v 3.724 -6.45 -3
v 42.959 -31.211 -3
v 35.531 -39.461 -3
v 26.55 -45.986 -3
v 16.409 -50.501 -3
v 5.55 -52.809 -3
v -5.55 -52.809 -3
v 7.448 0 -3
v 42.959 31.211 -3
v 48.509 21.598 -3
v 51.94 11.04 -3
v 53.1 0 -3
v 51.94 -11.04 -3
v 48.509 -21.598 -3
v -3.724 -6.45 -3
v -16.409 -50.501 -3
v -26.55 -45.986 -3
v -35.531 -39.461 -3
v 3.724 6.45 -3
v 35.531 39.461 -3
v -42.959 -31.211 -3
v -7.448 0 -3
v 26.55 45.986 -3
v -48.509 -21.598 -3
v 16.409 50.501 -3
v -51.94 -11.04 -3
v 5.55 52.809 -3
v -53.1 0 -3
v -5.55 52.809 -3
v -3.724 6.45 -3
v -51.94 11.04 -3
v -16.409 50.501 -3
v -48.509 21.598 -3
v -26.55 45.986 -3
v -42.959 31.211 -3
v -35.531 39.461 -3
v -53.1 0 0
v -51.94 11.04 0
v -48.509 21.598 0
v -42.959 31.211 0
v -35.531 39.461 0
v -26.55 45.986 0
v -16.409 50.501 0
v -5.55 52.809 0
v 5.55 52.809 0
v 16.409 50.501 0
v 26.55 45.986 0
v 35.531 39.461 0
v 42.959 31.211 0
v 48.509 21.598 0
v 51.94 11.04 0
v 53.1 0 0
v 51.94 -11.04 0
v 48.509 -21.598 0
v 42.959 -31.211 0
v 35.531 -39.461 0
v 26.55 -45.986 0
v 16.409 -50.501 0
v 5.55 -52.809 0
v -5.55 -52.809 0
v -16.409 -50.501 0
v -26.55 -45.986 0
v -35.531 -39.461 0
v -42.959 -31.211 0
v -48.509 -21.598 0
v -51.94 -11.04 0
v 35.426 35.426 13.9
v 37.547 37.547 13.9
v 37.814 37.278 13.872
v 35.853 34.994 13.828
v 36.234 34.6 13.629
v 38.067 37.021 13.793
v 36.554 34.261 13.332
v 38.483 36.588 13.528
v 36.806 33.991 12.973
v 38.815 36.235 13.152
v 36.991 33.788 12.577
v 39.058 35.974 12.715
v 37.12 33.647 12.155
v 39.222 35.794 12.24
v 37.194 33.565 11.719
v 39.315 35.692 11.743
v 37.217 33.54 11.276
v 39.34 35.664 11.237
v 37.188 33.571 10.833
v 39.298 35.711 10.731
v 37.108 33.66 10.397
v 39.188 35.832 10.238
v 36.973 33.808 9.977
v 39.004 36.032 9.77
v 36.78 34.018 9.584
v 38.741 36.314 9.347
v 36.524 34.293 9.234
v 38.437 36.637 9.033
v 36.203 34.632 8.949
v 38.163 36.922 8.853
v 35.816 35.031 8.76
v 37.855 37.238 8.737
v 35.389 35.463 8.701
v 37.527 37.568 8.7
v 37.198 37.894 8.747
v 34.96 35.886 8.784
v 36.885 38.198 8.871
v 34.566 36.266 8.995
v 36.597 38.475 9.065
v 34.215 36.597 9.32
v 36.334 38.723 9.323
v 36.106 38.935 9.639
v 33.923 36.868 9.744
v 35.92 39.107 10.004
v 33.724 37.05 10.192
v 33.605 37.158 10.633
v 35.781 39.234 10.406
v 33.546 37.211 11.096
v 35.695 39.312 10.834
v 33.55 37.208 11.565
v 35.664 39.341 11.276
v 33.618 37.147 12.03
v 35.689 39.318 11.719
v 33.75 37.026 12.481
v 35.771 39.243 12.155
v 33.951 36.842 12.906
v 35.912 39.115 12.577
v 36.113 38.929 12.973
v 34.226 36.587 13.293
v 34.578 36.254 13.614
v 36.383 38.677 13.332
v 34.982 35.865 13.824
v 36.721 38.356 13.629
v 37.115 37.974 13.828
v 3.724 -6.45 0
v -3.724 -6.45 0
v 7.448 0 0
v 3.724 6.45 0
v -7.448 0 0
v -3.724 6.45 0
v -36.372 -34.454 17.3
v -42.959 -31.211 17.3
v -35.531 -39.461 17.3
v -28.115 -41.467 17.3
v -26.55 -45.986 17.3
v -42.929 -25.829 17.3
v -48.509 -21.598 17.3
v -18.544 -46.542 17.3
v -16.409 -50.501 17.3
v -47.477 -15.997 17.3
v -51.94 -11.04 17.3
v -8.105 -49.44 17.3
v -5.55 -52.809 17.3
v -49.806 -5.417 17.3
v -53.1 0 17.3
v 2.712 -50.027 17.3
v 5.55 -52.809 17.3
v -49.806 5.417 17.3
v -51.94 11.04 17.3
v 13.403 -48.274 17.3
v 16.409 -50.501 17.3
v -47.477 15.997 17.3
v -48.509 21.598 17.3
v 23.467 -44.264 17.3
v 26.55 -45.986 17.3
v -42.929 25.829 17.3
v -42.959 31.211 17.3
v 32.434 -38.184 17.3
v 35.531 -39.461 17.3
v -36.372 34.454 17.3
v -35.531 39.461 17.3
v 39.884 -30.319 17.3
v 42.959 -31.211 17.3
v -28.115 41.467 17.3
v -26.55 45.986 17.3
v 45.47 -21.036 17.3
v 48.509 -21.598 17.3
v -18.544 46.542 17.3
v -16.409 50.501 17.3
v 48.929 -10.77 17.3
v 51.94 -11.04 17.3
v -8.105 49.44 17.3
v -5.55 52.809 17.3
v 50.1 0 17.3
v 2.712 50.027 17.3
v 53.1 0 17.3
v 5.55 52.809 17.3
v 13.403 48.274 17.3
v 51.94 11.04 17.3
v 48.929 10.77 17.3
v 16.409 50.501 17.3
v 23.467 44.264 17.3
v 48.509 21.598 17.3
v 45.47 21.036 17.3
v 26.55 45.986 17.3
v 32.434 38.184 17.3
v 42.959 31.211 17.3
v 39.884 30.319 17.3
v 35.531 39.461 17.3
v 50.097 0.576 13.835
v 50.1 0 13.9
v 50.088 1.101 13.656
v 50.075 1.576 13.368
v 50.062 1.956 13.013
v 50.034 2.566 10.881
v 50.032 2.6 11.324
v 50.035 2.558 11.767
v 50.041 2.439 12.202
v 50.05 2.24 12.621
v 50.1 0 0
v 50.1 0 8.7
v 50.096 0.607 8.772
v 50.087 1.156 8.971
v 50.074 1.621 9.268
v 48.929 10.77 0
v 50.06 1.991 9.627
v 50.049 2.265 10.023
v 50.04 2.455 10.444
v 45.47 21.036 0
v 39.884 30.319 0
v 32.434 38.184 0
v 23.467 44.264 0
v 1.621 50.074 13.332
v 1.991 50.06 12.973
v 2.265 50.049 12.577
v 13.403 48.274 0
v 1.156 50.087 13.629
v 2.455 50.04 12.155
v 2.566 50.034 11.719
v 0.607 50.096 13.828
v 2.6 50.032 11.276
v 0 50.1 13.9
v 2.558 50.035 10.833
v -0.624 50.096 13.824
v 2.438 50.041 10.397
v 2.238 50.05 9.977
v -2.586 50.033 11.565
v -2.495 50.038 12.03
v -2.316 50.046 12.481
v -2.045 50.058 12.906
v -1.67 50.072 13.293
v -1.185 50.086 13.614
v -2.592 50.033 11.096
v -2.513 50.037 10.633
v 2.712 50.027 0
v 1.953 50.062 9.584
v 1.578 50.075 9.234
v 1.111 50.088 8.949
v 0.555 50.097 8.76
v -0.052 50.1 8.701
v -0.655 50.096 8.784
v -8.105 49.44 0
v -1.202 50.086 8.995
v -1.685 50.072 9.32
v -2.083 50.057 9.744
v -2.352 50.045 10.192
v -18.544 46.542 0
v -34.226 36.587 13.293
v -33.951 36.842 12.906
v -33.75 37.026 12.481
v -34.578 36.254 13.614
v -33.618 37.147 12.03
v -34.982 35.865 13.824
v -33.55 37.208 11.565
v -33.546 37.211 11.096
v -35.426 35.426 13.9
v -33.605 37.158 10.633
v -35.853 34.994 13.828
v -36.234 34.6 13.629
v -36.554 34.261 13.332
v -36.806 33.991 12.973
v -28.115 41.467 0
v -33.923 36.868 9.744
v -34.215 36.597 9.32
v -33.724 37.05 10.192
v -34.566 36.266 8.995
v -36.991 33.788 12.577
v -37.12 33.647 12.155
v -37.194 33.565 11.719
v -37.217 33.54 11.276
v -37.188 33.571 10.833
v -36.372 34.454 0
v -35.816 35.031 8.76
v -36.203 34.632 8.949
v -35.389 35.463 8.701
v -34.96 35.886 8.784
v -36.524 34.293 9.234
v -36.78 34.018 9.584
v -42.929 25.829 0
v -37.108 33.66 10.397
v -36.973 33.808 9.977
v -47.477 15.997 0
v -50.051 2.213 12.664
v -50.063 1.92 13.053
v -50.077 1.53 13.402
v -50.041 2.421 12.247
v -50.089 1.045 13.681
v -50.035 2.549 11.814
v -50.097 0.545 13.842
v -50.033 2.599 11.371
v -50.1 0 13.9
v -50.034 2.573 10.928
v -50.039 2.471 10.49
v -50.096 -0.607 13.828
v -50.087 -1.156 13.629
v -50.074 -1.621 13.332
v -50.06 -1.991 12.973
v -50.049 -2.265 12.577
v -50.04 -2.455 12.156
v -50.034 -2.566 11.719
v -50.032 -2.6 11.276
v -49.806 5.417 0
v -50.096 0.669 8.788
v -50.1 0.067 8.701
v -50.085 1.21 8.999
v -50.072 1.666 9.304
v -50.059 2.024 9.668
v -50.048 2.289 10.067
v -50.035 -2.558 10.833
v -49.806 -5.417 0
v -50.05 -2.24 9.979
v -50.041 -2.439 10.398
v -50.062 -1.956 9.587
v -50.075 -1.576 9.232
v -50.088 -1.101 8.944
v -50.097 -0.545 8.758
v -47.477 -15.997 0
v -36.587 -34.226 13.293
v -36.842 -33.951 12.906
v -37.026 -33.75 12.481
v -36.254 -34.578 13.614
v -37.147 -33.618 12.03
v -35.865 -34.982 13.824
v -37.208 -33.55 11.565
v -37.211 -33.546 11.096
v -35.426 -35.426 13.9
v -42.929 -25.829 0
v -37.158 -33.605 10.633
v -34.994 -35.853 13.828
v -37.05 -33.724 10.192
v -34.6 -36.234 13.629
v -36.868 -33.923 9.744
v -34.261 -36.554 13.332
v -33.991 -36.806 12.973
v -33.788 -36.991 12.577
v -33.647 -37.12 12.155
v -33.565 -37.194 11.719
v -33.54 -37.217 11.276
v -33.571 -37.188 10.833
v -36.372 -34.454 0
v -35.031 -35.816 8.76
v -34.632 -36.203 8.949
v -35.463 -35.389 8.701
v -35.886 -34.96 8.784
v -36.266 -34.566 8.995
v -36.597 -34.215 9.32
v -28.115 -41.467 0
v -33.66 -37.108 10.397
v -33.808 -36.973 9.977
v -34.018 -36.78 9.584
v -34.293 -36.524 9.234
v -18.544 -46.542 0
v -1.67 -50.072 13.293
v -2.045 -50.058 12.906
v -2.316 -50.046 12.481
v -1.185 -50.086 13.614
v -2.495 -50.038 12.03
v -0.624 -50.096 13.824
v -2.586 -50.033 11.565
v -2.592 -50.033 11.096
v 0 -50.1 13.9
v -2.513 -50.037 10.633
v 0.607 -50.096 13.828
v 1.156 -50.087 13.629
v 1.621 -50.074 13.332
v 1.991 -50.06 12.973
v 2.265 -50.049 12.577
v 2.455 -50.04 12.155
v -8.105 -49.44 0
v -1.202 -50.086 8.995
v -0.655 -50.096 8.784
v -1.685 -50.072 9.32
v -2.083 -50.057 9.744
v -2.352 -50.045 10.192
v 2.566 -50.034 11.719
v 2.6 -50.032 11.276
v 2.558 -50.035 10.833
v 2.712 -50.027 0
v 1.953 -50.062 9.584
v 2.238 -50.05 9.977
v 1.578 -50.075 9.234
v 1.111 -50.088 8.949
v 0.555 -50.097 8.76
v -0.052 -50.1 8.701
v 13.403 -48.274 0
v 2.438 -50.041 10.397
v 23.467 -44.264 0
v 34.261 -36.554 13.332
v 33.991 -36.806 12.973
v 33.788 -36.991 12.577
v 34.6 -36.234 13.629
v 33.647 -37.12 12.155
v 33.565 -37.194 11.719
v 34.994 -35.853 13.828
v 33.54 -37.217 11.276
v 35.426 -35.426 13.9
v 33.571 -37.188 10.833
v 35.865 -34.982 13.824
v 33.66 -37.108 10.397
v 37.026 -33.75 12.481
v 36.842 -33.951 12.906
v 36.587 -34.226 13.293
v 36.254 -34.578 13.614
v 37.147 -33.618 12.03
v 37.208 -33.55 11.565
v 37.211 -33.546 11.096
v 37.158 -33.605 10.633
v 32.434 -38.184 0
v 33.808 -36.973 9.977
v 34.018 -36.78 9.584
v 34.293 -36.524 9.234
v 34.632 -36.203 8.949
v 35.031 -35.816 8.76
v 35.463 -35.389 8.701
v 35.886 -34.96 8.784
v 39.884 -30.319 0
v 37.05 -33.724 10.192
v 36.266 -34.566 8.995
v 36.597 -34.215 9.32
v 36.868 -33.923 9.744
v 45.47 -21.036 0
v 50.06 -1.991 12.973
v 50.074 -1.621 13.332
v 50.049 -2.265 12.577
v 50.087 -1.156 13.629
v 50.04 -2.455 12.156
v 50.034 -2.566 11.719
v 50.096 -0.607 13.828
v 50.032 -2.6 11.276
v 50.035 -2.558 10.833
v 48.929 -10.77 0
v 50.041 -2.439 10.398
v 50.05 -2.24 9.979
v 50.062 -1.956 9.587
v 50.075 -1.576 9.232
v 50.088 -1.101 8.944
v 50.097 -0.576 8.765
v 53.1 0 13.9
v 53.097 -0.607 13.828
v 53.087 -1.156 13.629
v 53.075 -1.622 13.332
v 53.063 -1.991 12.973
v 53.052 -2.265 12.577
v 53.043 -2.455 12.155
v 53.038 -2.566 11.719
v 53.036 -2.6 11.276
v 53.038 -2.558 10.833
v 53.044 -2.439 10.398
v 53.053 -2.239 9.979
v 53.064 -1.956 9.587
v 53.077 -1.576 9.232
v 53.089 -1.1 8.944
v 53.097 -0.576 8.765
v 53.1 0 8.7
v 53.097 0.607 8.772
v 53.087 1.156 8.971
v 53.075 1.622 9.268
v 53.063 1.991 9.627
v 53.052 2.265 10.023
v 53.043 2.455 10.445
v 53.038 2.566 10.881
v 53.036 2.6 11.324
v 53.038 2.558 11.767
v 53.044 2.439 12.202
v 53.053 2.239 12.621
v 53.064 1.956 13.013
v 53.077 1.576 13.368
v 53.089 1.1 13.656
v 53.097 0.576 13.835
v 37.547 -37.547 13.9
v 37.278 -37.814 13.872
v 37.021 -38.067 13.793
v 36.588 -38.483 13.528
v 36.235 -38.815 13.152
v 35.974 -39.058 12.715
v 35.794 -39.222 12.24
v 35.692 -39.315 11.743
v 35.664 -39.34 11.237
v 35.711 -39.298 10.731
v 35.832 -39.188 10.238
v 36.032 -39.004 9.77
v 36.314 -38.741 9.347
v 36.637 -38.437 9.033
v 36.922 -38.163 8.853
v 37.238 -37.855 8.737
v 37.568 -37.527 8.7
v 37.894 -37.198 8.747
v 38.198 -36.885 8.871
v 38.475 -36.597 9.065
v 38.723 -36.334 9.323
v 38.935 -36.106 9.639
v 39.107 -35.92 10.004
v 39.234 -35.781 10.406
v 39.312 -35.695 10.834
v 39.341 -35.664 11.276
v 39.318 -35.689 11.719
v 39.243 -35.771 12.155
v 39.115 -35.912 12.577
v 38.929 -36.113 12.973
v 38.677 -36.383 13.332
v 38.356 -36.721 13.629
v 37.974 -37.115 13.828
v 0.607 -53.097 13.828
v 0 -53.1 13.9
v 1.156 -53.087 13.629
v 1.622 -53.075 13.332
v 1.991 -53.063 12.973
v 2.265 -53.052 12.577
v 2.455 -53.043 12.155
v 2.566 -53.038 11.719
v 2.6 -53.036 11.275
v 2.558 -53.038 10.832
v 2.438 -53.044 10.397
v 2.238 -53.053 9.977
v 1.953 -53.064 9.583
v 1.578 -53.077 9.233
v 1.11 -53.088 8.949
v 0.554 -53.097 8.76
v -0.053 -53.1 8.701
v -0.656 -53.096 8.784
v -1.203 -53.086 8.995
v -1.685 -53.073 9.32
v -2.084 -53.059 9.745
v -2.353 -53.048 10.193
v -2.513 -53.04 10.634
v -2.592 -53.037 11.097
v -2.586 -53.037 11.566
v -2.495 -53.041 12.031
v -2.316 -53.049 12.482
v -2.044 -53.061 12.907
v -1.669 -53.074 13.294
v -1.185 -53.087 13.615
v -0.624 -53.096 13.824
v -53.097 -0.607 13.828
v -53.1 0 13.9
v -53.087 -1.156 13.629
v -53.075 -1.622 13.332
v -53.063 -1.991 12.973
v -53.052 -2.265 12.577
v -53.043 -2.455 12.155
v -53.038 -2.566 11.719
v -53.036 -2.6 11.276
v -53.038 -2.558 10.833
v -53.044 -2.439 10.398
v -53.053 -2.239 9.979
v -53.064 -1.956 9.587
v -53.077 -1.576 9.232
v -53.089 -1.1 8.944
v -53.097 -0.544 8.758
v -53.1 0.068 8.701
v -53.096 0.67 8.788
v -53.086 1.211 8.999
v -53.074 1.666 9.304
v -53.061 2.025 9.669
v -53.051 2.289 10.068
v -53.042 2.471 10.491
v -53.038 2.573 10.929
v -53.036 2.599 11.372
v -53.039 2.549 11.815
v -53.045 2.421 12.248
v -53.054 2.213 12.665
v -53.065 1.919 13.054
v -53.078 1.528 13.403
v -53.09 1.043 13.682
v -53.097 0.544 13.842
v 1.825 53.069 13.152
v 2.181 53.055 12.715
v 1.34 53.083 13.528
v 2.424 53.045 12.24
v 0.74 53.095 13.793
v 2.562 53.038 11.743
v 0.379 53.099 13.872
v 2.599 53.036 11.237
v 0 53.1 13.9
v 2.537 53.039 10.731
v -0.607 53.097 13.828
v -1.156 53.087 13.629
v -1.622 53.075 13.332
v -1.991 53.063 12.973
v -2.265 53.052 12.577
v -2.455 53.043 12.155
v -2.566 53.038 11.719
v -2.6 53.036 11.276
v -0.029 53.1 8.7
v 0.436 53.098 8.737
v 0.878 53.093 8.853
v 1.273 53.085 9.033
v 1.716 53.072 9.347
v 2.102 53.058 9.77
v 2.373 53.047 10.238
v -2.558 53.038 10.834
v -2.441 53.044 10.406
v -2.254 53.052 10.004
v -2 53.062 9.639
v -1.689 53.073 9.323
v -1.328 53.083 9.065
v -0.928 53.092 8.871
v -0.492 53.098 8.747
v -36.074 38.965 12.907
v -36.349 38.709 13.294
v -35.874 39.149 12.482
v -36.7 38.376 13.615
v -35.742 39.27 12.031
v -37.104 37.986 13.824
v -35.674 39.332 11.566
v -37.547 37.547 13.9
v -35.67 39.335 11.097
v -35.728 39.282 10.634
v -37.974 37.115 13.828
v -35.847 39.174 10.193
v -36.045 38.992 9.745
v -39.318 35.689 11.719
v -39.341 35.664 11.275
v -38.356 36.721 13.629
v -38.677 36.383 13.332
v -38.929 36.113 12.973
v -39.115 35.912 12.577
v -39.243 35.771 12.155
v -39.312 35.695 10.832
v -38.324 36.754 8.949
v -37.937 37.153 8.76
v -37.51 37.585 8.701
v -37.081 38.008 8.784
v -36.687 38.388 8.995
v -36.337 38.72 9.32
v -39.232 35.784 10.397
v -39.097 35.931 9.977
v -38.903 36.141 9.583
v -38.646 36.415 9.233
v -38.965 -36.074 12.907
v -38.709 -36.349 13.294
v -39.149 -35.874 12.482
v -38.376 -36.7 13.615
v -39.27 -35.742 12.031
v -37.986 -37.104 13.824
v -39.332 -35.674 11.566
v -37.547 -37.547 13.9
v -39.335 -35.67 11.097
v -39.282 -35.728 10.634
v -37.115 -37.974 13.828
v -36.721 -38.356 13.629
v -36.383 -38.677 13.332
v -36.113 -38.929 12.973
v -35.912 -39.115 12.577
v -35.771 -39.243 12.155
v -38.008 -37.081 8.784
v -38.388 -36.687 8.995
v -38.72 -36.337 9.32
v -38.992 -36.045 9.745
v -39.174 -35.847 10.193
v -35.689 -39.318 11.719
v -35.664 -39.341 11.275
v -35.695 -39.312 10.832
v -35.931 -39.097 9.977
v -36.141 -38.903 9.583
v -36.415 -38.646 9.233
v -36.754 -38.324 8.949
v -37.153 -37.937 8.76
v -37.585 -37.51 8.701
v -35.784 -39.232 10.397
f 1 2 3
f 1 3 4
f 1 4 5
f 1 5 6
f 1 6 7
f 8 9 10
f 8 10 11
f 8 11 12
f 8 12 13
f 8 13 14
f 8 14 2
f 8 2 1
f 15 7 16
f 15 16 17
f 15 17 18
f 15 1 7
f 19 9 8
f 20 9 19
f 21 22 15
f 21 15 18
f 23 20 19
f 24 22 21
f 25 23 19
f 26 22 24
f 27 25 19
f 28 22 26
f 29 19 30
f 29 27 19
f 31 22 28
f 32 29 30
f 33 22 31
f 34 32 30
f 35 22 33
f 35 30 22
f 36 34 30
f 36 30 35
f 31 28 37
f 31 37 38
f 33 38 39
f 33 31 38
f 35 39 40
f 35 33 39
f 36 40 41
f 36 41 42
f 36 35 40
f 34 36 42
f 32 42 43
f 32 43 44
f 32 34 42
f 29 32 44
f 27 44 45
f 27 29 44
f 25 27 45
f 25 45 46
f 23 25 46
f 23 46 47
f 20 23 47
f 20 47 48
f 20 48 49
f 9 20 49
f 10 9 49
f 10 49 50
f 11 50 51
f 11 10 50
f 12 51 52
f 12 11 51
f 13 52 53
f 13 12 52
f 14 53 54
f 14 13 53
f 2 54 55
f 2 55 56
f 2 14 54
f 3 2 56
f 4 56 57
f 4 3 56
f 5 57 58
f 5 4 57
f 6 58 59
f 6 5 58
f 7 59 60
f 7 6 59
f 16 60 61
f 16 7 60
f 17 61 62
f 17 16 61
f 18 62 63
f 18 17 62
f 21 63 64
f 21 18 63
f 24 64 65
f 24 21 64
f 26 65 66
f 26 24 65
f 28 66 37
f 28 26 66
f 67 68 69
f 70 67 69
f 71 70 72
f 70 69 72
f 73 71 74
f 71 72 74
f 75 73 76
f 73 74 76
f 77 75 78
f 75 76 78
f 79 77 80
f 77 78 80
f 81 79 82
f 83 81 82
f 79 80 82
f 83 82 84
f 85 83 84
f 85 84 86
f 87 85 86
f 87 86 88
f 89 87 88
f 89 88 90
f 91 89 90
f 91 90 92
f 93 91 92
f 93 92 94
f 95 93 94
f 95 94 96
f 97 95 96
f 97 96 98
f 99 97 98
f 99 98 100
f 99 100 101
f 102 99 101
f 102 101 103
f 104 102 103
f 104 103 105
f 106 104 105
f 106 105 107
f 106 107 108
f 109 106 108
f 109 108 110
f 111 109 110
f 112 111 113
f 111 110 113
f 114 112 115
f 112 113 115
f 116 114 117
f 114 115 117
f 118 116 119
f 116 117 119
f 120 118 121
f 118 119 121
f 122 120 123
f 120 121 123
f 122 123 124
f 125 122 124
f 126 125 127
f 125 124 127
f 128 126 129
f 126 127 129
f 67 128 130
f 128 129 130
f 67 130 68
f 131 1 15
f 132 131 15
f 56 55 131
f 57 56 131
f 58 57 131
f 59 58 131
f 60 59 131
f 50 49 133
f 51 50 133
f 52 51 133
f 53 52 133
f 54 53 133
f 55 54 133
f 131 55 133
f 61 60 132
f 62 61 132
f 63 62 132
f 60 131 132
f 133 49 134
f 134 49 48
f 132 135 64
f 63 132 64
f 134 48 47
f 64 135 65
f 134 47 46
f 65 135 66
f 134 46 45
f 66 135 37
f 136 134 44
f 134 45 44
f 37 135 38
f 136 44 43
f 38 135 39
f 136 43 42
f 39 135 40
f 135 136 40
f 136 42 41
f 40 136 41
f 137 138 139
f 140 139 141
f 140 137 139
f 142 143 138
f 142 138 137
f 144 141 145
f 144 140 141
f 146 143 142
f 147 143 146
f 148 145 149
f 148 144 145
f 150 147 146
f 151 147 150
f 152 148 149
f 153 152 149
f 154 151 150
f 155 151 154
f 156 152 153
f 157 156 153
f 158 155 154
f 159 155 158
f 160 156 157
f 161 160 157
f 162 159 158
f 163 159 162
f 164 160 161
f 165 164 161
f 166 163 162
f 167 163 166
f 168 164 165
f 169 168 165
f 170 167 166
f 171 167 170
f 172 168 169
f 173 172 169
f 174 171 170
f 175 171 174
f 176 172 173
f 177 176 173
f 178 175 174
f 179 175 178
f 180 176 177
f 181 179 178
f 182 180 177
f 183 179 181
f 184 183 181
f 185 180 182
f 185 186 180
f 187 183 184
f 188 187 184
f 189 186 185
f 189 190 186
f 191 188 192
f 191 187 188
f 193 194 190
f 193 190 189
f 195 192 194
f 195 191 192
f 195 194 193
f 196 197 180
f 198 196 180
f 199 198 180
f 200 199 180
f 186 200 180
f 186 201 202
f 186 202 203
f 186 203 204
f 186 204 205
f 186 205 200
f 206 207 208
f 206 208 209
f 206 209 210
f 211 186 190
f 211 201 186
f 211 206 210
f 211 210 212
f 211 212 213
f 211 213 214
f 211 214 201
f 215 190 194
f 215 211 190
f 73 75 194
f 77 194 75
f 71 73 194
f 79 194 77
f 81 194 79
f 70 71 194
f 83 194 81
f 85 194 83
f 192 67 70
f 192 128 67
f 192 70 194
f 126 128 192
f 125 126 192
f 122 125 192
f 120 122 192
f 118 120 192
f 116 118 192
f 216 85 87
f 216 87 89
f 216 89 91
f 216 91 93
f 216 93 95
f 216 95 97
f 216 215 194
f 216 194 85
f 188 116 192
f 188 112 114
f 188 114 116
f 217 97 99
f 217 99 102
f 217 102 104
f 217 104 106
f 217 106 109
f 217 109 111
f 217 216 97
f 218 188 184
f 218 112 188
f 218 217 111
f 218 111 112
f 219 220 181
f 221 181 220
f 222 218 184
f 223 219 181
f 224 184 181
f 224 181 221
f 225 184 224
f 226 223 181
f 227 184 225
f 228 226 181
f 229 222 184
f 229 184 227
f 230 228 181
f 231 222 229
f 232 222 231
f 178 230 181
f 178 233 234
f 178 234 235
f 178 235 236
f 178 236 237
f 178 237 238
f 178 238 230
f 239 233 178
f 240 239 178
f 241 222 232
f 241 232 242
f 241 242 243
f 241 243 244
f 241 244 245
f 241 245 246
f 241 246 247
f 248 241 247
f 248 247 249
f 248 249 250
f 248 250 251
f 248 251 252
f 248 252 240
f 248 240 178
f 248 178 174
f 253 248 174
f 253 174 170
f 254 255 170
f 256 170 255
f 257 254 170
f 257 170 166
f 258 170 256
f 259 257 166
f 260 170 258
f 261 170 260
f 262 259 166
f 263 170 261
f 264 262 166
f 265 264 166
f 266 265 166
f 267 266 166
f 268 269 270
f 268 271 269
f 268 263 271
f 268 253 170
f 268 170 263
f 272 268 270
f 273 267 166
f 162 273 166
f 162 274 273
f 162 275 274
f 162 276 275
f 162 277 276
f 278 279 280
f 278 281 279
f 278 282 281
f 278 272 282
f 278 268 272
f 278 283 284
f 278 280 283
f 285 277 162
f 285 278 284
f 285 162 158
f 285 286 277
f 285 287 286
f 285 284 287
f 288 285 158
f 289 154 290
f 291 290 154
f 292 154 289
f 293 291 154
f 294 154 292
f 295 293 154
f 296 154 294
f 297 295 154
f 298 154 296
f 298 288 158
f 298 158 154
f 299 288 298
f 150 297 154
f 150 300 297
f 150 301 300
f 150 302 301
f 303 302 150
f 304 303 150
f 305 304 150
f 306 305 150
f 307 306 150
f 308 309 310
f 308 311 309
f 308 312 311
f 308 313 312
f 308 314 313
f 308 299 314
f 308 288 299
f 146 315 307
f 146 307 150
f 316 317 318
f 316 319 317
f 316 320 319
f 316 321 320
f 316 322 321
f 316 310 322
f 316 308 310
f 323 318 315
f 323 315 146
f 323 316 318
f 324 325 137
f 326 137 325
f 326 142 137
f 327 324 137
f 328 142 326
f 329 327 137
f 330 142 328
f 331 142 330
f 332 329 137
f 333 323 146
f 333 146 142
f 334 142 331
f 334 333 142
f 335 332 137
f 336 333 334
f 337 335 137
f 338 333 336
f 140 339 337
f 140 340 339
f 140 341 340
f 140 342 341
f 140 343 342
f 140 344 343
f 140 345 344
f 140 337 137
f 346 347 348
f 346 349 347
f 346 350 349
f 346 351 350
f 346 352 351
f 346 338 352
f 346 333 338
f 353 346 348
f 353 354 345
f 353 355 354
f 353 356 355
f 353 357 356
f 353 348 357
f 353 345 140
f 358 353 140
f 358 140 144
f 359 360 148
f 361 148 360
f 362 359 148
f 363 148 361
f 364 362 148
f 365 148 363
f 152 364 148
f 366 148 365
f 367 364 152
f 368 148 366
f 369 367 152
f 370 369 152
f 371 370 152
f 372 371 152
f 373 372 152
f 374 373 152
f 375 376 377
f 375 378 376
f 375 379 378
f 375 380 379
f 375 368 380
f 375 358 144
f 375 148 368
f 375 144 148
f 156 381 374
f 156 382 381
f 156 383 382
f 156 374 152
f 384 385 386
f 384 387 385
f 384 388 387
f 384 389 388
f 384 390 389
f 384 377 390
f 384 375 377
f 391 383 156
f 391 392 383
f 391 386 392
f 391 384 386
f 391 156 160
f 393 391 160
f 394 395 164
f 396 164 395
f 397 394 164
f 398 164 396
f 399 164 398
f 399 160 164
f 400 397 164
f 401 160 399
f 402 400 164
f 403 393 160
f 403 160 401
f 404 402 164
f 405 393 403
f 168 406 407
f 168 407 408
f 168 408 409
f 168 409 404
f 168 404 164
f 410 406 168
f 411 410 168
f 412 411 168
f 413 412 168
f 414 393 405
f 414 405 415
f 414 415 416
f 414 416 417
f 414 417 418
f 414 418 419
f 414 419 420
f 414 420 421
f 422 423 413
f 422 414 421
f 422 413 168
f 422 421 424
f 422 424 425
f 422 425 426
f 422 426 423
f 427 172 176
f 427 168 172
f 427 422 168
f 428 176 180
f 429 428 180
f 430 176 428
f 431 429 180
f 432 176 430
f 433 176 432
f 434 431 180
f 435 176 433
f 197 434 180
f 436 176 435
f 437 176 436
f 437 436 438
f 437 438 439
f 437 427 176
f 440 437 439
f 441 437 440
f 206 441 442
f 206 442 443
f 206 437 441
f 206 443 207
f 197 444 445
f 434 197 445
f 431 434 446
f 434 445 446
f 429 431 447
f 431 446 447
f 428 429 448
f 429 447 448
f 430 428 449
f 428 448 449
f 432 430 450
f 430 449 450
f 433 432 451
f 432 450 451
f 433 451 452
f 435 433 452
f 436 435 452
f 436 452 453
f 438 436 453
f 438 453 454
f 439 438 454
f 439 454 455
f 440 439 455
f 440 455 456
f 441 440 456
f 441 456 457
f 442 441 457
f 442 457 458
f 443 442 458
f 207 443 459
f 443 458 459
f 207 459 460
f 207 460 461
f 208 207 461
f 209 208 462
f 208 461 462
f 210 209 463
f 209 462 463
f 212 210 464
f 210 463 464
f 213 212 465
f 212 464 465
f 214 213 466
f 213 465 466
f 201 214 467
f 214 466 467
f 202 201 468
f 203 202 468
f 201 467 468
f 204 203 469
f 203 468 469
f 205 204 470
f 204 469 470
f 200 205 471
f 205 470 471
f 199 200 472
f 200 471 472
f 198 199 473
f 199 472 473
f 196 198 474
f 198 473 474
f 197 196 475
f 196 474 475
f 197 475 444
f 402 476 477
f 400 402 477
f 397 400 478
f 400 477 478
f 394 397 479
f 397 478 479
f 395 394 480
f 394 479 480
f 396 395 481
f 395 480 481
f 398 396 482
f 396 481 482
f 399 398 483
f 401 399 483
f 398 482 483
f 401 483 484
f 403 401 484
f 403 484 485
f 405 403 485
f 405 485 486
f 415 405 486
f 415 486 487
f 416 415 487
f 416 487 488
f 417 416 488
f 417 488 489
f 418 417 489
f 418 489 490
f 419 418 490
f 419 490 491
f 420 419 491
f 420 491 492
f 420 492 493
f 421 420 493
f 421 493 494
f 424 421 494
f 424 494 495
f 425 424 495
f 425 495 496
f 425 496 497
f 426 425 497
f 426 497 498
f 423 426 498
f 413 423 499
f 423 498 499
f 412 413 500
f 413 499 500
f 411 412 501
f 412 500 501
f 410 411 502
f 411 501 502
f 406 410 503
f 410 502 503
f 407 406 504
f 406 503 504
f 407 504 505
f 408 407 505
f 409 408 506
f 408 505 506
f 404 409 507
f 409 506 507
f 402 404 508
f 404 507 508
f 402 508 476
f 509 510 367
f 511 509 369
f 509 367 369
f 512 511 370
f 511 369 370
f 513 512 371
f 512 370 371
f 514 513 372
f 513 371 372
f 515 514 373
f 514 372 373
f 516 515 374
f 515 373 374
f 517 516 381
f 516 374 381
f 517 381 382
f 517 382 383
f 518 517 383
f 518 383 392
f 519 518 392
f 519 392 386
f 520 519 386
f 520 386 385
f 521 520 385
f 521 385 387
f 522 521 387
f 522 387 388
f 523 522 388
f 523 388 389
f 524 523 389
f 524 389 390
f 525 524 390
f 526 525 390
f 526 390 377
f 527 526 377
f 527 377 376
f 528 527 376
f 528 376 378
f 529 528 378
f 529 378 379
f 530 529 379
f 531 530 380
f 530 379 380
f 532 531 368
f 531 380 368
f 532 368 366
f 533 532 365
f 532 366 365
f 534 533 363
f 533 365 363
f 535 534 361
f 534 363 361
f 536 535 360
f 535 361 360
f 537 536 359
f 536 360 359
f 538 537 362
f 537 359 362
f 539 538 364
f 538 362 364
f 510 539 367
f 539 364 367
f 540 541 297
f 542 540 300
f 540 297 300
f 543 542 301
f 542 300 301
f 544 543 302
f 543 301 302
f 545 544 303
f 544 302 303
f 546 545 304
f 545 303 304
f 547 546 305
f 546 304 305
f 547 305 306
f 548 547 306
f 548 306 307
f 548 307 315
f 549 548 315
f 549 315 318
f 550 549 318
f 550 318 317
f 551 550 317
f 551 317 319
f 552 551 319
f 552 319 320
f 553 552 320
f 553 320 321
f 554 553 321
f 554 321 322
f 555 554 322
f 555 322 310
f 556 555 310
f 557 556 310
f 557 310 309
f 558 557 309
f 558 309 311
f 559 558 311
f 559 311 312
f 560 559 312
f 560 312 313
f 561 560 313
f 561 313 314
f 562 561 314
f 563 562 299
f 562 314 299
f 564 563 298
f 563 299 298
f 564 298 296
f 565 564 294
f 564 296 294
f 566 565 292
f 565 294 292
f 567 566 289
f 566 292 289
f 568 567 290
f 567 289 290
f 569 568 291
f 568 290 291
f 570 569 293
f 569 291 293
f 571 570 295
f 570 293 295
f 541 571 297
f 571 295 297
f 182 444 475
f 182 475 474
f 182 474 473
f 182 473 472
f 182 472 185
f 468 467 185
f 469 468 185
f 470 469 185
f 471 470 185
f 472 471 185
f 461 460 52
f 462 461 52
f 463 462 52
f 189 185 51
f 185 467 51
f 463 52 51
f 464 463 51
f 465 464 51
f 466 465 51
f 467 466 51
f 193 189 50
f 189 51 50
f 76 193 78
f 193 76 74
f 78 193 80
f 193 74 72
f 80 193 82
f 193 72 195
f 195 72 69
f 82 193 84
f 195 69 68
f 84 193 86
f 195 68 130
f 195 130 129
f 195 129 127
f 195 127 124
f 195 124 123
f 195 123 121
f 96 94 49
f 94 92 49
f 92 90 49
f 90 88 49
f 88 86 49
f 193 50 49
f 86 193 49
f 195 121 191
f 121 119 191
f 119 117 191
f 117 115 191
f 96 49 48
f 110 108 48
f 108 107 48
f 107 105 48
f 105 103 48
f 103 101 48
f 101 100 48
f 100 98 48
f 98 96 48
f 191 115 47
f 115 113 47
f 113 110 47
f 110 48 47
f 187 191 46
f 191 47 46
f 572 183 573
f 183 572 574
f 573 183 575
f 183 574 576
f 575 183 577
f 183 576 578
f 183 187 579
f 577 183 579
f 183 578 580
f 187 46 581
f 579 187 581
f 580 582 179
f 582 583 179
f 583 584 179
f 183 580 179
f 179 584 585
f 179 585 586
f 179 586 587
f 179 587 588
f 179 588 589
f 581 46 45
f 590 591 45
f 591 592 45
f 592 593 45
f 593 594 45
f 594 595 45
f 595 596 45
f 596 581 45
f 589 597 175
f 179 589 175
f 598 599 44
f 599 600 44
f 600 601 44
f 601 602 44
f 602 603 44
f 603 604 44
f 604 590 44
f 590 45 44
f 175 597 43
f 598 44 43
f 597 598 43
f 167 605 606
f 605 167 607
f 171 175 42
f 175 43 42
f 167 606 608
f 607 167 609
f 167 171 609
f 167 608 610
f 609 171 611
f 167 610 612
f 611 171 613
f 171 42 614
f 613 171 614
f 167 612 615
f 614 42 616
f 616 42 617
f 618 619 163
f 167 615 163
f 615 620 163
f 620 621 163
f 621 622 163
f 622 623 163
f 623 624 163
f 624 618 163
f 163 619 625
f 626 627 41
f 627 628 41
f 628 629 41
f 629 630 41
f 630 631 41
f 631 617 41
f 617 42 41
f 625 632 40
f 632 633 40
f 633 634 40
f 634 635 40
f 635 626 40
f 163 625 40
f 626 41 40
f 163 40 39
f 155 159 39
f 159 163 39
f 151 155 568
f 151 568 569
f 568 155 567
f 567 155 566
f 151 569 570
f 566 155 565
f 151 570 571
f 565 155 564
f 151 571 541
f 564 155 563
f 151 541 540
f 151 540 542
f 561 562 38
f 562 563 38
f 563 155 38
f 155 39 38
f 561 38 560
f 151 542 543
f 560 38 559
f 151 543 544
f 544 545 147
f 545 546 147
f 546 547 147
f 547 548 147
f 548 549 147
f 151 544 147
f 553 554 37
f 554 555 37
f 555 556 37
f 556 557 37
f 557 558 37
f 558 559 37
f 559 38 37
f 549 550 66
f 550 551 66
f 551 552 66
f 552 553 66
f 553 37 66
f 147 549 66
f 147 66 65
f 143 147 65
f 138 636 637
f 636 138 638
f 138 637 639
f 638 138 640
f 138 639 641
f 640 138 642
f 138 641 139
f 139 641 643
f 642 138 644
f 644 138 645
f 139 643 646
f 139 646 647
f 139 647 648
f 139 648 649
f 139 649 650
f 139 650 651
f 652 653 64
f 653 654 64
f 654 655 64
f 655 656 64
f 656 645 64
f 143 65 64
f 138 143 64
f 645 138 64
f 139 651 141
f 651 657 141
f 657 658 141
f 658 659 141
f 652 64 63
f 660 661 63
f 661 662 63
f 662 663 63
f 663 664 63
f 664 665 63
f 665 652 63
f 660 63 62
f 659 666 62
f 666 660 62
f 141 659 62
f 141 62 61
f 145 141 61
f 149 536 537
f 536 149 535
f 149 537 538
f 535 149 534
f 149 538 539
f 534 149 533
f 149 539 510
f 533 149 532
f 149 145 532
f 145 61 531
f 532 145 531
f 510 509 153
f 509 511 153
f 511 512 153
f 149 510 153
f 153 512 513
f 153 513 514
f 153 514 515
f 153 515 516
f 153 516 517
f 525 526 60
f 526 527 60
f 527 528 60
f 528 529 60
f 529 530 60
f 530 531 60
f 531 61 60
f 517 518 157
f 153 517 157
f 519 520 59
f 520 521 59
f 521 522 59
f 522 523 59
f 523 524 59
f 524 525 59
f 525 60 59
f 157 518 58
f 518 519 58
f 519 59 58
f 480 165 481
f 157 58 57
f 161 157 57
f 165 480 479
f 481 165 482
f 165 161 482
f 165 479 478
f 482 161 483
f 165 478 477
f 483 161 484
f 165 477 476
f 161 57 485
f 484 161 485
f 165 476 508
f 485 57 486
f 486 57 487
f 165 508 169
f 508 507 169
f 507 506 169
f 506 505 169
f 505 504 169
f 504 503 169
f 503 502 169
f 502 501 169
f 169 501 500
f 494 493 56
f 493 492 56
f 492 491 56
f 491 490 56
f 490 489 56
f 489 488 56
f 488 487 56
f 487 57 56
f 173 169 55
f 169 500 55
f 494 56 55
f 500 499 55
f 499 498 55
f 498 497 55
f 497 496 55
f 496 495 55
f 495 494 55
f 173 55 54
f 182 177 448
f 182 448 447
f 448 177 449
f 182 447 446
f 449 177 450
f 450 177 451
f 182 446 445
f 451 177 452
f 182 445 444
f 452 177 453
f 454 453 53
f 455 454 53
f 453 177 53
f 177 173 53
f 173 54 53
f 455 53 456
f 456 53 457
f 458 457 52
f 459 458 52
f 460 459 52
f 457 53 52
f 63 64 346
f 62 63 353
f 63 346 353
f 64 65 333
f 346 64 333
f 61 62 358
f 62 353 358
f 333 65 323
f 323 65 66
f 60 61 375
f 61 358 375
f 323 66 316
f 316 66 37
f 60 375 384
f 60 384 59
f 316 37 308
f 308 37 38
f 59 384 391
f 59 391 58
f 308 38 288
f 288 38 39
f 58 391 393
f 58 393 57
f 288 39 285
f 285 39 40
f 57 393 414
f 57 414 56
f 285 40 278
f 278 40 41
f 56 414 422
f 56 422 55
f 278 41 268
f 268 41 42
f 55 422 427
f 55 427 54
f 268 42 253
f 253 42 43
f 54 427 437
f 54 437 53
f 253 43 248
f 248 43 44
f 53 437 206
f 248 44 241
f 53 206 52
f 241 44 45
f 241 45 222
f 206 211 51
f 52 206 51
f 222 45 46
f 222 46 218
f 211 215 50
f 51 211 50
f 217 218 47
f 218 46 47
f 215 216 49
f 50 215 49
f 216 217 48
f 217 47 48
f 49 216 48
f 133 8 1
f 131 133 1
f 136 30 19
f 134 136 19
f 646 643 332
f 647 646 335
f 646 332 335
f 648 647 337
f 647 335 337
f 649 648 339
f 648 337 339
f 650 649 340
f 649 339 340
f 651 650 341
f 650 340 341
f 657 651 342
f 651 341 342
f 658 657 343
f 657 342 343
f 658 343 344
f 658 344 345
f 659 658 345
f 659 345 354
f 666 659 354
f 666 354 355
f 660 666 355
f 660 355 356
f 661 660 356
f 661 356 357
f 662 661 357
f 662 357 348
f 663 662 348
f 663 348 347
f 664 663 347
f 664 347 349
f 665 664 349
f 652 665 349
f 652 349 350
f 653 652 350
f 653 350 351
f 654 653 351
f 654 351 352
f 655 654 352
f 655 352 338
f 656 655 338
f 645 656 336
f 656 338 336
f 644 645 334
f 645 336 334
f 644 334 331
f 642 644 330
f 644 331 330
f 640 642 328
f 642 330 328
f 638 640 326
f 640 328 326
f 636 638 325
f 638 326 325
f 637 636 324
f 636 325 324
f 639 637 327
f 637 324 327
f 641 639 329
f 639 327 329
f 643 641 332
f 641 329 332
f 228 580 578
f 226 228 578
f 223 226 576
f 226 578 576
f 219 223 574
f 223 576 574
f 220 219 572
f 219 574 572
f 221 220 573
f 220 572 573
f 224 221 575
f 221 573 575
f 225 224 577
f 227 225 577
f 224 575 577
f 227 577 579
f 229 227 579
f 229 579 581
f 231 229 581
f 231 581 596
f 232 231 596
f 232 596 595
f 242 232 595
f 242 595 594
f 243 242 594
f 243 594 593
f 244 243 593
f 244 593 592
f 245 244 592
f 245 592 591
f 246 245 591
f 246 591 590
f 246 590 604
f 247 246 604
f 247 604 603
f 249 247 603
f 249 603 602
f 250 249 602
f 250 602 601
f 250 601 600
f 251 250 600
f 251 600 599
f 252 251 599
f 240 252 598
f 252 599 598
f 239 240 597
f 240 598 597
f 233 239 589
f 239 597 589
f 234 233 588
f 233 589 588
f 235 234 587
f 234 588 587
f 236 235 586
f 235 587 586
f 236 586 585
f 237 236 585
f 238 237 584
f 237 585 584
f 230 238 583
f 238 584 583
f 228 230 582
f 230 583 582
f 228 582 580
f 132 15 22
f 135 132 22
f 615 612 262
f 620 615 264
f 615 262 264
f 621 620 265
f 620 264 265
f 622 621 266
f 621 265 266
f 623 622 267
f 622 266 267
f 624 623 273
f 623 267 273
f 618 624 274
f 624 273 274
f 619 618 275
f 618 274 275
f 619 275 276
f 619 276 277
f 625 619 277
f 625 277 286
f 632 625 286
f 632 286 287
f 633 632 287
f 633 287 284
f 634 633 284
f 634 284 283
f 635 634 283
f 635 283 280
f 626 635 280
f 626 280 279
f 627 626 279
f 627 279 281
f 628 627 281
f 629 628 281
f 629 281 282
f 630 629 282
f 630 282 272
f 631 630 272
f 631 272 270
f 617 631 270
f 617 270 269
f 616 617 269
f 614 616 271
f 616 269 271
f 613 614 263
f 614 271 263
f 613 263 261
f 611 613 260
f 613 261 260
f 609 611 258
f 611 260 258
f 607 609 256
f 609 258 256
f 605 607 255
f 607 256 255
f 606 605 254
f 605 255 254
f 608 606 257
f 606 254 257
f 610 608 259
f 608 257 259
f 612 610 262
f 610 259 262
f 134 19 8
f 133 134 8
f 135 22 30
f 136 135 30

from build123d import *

# Parameters (mm, degrees)
SKETCH_1_R               = 53.1
SKETCH_1_R_2             = 50.1
EXTRUDE_1_DEPTH          = 22.3
EXTRUDE_START            = 3
SKETCH_2_R               = 53.1
EXTRUDE_2_DEPTH          = 3
SKETCH_4_R               = 2.6
CUT_EXTRUDE_3_DEPTH      = 121.81117498
PATTERN_CIRCULAR_1_COUNT = 8
CUT_EXTRUDE_4_DEPTH      = 10
SKETCH_5_R               = 65.353974711
CUT_EXTRUDE_5_DEPTH      = 5


with BuildPart() as part:
    # 草图1 → 凸台-拉伸1 (new body)
    with BuildSketch(Plane.XY):
        Circle(SKETCH_1_R)
        Circle(SKETCH_1_R_2, mode=Mode.SUBTRACT)
    extrude(amount=EXTRUDE_1_DEPTH)

    # 草图4 → 切除-拉伸3 (cut, through all)
    with BuildSketch(Plane(origin=(0, 53.1, 0), x_dir=(1, 0, 0), z_dir=(0, 1, 0))):
        with Locations(Location((0, -11.3, 0), (0, 0, 270))):
            Circle(SKETCH_4_R)
    cut_extrude_3 = extrude(amount=-CUT_EXTRUDE_3_DEPTH, mode=Mode.SUBTRACT)

    # 阵列(圆周)1: 切除-拉伸3 ×8 about axis
    pattern_circular_1_axis = Axis((0, 0, -3), (0, 0, -1))
    for i in range(1, PATTERN_CIRCULAR_1_COUNT):
        add(cut_extrude_3.rotate(pattern_circular_1_axis, i * 360 / PATTERN_CIRCULAR_1_COUNT), mode=Mode.SUBTRACT)

    # 草图5 → 切除-拉伸5 (cut)
    with BuildSketch(Plane.XY.offset(22.3)):
        Circle(SKETCH_5_R)
    extrude(amount=-CUT_EXTRUDE_5_DEPTH, mode=Mode.SUBTRACT)


with BuildPart() as body_2:
    # 草图2 → 凸台-拉伸2 (new body)
    with BuildSketch(Plane(origin=(0, 0, 0), x_dir=(-1, 0, 0), z_dir=(0, 0, -1)).offset(EXTRUDE_START)):
        Circle(SKETCH_2_R)
    extrude(amount=-EXTRUDE_2_DEPTH)

    # 草图3 → 切除-拉伸4 (cut)
    with BuildSketch(Plane(origin=(0, 0, -3), x_dir=(-1, 0, 0), z_dir=(0, 0, -1))):
        Polygon((3.723909236, -6.45), (7.447818473, 0), (3.723909236, 6.45), (-3.723909236, 6.45), (-7.447818473, 0), (-3.723909236, -6.45), align=None)
    extrude(amount=-CUT_EXTRUDE_4_DEPTH, mode=Mode.SUBTRACT)


solid = Compound([part.part, body_2.part])
